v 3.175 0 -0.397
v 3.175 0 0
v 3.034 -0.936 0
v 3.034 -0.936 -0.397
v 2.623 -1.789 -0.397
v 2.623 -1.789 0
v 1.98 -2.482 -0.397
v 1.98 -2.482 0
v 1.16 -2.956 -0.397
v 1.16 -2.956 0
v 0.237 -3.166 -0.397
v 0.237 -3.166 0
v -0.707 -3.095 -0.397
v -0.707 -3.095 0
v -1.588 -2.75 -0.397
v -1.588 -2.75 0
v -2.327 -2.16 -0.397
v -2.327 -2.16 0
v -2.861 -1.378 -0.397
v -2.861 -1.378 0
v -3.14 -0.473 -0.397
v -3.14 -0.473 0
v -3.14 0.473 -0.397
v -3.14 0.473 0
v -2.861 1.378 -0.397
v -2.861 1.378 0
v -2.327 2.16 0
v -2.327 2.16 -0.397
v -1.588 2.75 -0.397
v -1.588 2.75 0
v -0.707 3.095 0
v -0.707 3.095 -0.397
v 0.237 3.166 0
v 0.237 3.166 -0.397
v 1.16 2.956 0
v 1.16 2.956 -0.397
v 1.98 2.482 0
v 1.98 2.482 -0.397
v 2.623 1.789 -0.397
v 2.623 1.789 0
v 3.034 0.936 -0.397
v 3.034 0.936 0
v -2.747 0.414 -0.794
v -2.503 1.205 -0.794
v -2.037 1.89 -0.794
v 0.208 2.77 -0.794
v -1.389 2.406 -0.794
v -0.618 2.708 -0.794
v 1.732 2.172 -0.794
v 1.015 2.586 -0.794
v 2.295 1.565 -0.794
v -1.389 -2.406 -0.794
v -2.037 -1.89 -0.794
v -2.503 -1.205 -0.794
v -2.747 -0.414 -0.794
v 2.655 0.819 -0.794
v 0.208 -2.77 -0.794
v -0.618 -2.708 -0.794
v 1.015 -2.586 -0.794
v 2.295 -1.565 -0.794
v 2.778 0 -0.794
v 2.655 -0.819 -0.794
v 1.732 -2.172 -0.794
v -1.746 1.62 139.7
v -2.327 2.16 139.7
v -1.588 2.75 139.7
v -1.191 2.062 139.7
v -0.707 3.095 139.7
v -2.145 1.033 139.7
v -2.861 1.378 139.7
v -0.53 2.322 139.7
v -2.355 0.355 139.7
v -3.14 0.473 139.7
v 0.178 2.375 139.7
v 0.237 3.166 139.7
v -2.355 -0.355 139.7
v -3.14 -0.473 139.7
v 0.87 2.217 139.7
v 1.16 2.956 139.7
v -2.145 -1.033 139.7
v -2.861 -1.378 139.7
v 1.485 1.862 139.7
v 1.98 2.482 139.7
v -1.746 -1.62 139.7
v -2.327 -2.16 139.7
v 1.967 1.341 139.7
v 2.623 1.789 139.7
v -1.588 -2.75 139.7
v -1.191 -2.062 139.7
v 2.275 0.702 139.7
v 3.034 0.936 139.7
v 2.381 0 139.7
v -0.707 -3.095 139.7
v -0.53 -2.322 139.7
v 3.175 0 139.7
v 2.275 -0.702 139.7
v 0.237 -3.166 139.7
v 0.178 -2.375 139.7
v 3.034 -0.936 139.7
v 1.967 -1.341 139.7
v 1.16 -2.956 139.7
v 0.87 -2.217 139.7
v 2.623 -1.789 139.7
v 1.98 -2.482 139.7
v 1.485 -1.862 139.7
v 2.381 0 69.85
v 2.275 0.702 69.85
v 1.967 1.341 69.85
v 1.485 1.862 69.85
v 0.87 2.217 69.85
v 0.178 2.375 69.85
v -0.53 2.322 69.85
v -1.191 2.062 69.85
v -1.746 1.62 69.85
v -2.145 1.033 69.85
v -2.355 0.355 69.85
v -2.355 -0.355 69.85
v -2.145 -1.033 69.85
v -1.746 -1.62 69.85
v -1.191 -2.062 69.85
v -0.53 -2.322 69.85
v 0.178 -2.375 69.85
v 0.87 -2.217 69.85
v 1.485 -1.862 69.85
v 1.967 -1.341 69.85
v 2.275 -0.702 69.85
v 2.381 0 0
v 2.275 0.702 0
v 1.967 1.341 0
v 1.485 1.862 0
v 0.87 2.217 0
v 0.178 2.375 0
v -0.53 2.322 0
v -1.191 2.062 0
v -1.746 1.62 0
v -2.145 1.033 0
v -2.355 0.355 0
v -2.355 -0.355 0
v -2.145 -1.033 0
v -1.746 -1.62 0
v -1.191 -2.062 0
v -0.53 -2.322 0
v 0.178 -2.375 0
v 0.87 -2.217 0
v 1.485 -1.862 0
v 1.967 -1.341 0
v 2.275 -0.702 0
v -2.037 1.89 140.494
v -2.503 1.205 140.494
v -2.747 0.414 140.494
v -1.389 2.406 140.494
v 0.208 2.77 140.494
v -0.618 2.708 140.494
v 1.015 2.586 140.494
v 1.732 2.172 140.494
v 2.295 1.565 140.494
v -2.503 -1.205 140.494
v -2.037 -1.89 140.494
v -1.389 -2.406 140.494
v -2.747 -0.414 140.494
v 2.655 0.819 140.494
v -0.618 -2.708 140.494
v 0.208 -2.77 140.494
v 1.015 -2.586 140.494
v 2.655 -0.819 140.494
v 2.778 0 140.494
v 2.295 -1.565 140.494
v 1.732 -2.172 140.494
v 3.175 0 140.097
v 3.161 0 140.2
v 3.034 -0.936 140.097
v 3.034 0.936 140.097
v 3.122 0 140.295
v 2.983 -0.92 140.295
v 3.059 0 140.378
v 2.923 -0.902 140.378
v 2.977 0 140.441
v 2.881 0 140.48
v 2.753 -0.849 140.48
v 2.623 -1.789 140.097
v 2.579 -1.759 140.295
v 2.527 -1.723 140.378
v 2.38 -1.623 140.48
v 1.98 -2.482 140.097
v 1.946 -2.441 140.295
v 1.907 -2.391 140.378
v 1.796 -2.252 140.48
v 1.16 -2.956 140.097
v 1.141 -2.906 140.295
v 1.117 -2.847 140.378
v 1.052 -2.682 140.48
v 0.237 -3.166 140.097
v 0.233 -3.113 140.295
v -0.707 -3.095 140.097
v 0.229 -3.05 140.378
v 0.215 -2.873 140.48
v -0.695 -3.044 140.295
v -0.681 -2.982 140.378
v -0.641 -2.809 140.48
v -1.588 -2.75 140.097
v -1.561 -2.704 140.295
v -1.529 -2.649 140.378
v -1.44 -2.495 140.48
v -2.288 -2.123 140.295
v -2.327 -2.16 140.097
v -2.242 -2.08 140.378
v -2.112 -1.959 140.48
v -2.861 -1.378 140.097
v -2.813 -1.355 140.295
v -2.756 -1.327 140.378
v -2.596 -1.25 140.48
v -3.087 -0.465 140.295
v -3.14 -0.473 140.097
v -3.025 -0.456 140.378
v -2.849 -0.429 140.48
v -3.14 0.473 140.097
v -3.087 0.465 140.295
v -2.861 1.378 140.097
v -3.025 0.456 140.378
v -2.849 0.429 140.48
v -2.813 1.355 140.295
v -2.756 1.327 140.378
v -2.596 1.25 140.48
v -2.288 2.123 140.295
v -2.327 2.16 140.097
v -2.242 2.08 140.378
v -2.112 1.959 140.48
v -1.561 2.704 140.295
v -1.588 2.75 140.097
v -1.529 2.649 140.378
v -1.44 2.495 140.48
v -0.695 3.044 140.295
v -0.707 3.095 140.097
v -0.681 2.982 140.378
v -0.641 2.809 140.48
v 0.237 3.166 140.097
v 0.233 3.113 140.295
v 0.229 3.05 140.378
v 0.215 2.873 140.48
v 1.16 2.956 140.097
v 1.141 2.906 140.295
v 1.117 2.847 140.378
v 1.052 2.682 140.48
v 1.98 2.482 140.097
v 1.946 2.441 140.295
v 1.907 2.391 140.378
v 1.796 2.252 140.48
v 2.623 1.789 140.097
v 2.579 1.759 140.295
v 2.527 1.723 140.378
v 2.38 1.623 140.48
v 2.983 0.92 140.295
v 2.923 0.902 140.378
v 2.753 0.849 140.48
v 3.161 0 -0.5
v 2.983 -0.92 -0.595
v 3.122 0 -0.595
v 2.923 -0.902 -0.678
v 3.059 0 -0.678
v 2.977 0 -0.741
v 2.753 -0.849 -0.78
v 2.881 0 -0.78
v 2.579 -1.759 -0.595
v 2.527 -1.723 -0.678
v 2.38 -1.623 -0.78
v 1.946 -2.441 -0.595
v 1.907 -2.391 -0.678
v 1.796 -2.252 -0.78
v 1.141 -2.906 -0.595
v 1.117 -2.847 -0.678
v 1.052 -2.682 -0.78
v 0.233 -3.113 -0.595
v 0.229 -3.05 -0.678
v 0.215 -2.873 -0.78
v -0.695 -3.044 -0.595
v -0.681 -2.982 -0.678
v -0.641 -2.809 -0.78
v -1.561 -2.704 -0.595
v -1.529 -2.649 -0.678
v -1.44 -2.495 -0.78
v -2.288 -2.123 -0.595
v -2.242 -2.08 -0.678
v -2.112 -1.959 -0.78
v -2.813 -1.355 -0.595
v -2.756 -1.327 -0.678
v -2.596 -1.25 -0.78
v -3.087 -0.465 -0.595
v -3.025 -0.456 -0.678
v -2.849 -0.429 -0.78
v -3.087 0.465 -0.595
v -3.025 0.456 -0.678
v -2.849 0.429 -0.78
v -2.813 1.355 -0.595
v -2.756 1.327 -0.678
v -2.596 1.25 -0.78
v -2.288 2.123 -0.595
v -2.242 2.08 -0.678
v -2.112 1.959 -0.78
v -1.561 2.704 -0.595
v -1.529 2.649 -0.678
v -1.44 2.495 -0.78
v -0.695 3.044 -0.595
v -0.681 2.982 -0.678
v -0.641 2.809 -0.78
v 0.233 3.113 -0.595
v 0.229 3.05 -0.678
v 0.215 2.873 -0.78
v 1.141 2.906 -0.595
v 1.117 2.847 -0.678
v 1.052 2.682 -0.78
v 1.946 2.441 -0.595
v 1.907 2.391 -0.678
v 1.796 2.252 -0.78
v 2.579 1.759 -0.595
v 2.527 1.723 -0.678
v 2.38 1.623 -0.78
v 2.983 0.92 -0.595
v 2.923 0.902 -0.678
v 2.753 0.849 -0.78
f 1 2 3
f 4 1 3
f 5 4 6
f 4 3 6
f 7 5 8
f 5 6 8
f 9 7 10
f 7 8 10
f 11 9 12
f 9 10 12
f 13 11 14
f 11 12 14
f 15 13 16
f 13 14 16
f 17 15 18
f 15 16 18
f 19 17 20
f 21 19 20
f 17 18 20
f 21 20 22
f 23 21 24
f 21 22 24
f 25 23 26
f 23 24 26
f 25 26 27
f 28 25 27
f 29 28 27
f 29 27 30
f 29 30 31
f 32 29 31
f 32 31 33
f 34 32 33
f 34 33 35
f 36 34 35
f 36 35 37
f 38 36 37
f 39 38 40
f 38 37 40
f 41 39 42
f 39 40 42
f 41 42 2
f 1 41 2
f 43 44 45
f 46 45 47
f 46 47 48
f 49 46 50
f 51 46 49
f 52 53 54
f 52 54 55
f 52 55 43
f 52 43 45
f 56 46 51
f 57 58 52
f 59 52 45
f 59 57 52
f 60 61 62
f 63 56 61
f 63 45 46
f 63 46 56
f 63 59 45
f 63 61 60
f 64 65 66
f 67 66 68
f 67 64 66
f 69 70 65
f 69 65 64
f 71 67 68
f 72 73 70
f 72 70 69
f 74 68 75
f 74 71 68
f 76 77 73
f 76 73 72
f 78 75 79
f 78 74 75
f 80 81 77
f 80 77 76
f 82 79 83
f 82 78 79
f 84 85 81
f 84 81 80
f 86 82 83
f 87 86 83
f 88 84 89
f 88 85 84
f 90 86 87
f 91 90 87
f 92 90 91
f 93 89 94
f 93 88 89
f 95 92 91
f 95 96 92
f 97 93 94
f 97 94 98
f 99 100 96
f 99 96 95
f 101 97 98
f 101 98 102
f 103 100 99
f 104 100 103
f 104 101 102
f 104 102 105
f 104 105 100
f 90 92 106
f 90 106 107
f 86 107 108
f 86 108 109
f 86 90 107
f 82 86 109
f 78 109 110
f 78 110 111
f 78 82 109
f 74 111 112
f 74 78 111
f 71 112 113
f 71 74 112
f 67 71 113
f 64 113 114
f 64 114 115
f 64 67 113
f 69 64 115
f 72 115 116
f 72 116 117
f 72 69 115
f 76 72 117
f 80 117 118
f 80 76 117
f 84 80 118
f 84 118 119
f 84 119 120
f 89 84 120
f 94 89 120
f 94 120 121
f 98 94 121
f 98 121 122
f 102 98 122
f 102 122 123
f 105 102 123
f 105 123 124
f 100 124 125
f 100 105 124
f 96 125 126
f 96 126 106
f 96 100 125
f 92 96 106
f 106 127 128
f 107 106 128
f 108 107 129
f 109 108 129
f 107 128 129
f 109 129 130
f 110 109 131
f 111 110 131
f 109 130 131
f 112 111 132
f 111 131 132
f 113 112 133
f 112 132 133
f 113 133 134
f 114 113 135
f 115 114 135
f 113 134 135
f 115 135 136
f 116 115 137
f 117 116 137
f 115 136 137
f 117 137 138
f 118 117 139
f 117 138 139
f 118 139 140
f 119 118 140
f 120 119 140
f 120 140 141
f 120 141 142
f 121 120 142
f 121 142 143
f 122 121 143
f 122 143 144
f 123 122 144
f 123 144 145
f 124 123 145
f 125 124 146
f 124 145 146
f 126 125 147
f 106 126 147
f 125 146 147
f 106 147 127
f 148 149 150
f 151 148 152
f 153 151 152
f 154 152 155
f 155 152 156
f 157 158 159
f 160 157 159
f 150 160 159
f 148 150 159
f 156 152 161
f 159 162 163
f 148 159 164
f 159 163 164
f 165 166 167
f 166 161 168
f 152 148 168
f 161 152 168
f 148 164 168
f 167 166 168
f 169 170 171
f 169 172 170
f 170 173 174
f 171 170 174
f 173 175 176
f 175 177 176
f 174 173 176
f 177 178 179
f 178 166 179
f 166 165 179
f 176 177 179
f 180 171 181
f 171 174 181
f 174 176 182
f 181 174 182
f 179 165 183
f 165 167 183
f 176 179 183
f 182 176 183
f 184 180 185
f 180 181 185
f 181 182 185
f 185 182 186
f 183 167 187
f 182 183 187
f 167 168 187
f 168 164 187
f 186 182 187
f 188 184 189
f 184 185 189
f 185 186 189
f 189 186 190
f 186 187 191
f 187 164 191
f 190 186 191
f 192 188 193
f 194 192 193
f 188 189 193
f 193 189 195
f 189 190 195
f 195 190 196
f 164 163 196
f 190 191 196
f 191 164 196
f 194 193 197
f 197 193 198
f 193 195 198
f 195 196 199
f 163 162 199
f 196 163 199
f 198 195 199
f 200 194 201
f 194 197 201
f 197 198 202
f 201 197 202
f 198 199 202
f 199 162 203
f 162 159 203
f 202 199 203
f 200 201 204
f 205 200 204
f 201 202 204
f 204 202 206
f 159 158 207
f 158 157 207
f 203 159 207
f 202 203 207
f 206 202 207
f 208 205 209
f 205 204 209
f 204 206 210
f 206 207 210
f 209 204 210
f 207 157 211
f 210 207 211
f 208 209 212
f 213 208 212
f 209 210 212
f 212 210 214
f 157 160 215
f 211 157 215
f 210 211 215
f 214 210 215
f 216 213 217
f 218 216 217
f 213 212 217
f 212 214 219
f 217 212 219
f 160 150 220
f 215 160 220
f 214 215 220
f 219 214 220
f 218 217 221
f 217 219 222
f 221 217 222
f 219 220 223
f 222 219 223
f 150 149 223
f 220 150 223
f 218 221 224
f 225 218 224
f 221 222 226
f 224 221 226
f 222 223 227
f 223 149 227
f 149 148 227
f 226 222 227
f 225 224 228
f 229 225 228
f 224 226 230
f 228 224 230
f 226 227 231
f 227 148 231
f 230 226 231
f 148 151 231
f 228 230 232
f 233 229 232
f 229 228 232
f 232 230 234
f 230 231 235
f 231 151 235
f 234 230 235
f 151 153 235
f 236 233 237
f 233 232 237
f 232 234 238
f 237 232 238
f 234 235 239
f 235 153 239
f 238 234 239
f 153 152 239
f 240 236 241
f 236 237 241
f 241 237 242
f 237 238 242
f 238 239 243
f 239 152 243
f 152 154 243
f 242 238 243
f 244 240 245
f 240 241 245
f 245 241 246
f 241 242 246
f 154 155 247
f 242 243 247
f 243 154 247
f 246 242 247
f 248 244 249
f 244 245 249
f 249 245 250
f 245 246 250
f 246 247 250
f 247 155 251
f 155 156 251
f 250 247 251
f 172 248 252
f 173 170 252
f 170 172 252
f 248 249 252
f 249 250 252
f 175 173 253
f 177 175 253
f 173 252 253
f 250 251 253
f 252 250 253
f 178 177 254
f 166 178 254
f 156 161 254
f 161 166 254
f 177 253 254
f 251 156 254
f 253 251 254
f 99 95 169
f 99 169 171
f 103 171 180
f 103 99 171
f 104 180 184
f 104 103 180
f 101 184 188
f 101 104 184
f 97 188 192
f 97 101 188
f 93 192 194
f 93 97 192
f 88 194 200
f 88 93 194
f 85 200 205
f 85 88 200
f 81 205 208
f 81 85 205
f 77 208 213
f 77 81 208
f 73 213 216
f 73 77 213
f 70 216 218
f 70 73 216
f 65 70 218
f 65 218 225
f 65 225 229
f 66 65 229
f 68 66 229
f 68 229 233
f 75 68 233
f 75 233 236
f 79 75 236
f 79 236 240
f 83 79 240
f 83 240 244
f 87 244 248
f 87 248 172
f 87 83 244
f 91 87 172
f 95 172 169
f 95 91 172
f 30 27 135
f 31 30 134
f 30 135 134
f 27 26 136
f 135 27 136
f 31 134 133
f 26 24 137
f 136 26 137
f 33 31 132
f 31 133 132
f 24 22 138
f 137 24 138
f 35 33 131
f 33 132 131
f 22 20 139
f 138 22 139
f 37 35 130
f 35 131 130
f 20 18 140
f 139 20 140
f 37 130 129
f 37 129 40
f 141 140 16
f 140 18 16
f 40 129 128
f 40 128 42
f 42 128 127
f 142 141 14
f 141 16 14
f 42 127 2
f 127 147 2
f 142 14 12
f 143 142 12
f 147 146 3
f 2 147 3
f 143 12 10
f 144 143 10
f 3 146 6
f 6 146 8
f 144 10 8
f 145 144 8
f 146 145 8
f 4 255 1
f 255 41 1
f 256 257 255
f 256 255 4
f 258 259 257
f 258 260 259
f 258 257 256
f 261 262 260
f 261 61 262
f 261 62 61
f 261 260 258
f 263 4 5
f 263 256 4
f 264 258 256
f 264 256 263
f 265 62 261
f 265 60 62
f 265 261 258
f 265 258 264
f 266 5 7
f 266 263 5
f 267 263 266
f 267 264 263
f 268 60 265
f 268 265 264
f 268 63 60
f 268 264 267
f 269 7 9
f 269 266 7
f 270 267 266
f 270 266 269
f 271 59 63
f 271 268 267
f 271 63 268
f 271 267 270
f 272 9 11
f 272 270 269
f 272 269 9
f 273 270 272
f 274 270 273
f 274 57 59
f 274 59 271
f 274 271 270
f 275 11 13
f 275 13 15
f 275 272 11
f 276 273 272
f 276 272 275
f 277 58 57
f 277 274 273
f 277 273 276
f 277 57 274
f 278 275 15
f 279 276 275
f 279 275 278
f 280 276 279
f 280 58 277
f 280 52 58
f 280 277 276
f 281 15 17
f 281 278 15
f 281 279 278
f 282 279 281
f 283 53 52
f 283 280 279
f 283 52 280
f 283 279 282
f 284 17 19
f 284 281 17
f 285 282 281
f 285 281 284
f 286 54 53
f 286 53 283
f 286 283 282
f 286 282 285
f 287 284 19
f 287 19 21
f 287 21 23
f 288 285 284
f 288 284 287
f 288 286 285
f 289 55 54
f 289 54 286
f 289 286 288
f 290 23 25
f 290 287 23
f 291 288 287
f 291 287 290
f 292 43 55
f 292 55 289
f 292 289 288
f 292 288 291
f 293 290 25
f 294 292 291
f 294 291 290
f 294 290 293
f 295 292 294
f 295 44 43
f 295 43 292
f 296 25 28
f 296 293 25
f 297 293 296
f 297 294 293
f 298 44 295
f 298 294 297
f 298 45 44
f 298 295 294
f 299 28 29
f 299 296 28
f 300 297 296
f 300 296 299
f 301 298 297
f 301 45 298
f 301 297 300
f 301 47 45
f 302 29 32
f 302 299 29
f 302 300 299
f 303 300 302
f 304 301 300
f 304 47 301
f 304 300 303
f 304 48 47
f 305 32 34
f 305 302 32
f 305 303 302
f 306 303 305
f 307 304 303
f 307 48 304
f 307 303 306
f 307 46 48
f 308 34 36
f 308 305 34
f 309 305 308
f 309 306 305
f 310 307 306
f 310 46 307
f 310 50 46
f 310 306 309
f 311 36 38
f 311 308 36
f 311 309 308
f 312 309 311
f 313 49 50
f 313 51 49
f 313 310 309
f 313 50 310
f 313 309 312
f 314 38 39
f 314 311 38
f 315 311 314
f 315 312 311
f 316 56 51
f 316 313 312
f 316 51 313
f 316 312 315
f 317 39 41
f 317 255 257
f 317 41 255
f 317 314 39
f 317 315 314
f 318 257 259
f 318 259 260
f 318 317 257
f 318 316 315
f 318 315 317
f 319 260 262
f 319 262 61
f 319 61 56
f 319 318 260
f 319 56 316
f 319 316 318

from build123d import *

# Parameters (mm, degrees)
F0_R     = 2.38125
F1_DEPTH = 69.85
F2_R     = 3.175
F3_DEPTH = 0.79375
F4_R     = 0.396875


with BuildPart() as f1:
    # F0 (on Top) → F1 (new body)
    with BuildSketch(Plane.XY):
        Circle(F0_R)
    extrude(amount=F1_DEPTH)

    # F2 (on face) → F3 (join)
    with BuildSketch(Plane(origin=(0, 0, 0), x_dir=(1, 0, 0), z_dir=(0, 0, -1))):
        Circle(F2_R)
    extrude(amount=F3_DEPTH)

    # F4
    f4_edges = [f1.edges().sort_by_distance(p)[0] for p in [
        (-3.175, 0, -0.79375),
    ]]
    fillet(f4_edges, radius=F4_R)

    # F5: F1 across face


with BuildPart() as f1_1:
    add(f1.part)
    add(f1.part.mirror(Plane.XY.offset(69.85)))


solid = f1_1.part
